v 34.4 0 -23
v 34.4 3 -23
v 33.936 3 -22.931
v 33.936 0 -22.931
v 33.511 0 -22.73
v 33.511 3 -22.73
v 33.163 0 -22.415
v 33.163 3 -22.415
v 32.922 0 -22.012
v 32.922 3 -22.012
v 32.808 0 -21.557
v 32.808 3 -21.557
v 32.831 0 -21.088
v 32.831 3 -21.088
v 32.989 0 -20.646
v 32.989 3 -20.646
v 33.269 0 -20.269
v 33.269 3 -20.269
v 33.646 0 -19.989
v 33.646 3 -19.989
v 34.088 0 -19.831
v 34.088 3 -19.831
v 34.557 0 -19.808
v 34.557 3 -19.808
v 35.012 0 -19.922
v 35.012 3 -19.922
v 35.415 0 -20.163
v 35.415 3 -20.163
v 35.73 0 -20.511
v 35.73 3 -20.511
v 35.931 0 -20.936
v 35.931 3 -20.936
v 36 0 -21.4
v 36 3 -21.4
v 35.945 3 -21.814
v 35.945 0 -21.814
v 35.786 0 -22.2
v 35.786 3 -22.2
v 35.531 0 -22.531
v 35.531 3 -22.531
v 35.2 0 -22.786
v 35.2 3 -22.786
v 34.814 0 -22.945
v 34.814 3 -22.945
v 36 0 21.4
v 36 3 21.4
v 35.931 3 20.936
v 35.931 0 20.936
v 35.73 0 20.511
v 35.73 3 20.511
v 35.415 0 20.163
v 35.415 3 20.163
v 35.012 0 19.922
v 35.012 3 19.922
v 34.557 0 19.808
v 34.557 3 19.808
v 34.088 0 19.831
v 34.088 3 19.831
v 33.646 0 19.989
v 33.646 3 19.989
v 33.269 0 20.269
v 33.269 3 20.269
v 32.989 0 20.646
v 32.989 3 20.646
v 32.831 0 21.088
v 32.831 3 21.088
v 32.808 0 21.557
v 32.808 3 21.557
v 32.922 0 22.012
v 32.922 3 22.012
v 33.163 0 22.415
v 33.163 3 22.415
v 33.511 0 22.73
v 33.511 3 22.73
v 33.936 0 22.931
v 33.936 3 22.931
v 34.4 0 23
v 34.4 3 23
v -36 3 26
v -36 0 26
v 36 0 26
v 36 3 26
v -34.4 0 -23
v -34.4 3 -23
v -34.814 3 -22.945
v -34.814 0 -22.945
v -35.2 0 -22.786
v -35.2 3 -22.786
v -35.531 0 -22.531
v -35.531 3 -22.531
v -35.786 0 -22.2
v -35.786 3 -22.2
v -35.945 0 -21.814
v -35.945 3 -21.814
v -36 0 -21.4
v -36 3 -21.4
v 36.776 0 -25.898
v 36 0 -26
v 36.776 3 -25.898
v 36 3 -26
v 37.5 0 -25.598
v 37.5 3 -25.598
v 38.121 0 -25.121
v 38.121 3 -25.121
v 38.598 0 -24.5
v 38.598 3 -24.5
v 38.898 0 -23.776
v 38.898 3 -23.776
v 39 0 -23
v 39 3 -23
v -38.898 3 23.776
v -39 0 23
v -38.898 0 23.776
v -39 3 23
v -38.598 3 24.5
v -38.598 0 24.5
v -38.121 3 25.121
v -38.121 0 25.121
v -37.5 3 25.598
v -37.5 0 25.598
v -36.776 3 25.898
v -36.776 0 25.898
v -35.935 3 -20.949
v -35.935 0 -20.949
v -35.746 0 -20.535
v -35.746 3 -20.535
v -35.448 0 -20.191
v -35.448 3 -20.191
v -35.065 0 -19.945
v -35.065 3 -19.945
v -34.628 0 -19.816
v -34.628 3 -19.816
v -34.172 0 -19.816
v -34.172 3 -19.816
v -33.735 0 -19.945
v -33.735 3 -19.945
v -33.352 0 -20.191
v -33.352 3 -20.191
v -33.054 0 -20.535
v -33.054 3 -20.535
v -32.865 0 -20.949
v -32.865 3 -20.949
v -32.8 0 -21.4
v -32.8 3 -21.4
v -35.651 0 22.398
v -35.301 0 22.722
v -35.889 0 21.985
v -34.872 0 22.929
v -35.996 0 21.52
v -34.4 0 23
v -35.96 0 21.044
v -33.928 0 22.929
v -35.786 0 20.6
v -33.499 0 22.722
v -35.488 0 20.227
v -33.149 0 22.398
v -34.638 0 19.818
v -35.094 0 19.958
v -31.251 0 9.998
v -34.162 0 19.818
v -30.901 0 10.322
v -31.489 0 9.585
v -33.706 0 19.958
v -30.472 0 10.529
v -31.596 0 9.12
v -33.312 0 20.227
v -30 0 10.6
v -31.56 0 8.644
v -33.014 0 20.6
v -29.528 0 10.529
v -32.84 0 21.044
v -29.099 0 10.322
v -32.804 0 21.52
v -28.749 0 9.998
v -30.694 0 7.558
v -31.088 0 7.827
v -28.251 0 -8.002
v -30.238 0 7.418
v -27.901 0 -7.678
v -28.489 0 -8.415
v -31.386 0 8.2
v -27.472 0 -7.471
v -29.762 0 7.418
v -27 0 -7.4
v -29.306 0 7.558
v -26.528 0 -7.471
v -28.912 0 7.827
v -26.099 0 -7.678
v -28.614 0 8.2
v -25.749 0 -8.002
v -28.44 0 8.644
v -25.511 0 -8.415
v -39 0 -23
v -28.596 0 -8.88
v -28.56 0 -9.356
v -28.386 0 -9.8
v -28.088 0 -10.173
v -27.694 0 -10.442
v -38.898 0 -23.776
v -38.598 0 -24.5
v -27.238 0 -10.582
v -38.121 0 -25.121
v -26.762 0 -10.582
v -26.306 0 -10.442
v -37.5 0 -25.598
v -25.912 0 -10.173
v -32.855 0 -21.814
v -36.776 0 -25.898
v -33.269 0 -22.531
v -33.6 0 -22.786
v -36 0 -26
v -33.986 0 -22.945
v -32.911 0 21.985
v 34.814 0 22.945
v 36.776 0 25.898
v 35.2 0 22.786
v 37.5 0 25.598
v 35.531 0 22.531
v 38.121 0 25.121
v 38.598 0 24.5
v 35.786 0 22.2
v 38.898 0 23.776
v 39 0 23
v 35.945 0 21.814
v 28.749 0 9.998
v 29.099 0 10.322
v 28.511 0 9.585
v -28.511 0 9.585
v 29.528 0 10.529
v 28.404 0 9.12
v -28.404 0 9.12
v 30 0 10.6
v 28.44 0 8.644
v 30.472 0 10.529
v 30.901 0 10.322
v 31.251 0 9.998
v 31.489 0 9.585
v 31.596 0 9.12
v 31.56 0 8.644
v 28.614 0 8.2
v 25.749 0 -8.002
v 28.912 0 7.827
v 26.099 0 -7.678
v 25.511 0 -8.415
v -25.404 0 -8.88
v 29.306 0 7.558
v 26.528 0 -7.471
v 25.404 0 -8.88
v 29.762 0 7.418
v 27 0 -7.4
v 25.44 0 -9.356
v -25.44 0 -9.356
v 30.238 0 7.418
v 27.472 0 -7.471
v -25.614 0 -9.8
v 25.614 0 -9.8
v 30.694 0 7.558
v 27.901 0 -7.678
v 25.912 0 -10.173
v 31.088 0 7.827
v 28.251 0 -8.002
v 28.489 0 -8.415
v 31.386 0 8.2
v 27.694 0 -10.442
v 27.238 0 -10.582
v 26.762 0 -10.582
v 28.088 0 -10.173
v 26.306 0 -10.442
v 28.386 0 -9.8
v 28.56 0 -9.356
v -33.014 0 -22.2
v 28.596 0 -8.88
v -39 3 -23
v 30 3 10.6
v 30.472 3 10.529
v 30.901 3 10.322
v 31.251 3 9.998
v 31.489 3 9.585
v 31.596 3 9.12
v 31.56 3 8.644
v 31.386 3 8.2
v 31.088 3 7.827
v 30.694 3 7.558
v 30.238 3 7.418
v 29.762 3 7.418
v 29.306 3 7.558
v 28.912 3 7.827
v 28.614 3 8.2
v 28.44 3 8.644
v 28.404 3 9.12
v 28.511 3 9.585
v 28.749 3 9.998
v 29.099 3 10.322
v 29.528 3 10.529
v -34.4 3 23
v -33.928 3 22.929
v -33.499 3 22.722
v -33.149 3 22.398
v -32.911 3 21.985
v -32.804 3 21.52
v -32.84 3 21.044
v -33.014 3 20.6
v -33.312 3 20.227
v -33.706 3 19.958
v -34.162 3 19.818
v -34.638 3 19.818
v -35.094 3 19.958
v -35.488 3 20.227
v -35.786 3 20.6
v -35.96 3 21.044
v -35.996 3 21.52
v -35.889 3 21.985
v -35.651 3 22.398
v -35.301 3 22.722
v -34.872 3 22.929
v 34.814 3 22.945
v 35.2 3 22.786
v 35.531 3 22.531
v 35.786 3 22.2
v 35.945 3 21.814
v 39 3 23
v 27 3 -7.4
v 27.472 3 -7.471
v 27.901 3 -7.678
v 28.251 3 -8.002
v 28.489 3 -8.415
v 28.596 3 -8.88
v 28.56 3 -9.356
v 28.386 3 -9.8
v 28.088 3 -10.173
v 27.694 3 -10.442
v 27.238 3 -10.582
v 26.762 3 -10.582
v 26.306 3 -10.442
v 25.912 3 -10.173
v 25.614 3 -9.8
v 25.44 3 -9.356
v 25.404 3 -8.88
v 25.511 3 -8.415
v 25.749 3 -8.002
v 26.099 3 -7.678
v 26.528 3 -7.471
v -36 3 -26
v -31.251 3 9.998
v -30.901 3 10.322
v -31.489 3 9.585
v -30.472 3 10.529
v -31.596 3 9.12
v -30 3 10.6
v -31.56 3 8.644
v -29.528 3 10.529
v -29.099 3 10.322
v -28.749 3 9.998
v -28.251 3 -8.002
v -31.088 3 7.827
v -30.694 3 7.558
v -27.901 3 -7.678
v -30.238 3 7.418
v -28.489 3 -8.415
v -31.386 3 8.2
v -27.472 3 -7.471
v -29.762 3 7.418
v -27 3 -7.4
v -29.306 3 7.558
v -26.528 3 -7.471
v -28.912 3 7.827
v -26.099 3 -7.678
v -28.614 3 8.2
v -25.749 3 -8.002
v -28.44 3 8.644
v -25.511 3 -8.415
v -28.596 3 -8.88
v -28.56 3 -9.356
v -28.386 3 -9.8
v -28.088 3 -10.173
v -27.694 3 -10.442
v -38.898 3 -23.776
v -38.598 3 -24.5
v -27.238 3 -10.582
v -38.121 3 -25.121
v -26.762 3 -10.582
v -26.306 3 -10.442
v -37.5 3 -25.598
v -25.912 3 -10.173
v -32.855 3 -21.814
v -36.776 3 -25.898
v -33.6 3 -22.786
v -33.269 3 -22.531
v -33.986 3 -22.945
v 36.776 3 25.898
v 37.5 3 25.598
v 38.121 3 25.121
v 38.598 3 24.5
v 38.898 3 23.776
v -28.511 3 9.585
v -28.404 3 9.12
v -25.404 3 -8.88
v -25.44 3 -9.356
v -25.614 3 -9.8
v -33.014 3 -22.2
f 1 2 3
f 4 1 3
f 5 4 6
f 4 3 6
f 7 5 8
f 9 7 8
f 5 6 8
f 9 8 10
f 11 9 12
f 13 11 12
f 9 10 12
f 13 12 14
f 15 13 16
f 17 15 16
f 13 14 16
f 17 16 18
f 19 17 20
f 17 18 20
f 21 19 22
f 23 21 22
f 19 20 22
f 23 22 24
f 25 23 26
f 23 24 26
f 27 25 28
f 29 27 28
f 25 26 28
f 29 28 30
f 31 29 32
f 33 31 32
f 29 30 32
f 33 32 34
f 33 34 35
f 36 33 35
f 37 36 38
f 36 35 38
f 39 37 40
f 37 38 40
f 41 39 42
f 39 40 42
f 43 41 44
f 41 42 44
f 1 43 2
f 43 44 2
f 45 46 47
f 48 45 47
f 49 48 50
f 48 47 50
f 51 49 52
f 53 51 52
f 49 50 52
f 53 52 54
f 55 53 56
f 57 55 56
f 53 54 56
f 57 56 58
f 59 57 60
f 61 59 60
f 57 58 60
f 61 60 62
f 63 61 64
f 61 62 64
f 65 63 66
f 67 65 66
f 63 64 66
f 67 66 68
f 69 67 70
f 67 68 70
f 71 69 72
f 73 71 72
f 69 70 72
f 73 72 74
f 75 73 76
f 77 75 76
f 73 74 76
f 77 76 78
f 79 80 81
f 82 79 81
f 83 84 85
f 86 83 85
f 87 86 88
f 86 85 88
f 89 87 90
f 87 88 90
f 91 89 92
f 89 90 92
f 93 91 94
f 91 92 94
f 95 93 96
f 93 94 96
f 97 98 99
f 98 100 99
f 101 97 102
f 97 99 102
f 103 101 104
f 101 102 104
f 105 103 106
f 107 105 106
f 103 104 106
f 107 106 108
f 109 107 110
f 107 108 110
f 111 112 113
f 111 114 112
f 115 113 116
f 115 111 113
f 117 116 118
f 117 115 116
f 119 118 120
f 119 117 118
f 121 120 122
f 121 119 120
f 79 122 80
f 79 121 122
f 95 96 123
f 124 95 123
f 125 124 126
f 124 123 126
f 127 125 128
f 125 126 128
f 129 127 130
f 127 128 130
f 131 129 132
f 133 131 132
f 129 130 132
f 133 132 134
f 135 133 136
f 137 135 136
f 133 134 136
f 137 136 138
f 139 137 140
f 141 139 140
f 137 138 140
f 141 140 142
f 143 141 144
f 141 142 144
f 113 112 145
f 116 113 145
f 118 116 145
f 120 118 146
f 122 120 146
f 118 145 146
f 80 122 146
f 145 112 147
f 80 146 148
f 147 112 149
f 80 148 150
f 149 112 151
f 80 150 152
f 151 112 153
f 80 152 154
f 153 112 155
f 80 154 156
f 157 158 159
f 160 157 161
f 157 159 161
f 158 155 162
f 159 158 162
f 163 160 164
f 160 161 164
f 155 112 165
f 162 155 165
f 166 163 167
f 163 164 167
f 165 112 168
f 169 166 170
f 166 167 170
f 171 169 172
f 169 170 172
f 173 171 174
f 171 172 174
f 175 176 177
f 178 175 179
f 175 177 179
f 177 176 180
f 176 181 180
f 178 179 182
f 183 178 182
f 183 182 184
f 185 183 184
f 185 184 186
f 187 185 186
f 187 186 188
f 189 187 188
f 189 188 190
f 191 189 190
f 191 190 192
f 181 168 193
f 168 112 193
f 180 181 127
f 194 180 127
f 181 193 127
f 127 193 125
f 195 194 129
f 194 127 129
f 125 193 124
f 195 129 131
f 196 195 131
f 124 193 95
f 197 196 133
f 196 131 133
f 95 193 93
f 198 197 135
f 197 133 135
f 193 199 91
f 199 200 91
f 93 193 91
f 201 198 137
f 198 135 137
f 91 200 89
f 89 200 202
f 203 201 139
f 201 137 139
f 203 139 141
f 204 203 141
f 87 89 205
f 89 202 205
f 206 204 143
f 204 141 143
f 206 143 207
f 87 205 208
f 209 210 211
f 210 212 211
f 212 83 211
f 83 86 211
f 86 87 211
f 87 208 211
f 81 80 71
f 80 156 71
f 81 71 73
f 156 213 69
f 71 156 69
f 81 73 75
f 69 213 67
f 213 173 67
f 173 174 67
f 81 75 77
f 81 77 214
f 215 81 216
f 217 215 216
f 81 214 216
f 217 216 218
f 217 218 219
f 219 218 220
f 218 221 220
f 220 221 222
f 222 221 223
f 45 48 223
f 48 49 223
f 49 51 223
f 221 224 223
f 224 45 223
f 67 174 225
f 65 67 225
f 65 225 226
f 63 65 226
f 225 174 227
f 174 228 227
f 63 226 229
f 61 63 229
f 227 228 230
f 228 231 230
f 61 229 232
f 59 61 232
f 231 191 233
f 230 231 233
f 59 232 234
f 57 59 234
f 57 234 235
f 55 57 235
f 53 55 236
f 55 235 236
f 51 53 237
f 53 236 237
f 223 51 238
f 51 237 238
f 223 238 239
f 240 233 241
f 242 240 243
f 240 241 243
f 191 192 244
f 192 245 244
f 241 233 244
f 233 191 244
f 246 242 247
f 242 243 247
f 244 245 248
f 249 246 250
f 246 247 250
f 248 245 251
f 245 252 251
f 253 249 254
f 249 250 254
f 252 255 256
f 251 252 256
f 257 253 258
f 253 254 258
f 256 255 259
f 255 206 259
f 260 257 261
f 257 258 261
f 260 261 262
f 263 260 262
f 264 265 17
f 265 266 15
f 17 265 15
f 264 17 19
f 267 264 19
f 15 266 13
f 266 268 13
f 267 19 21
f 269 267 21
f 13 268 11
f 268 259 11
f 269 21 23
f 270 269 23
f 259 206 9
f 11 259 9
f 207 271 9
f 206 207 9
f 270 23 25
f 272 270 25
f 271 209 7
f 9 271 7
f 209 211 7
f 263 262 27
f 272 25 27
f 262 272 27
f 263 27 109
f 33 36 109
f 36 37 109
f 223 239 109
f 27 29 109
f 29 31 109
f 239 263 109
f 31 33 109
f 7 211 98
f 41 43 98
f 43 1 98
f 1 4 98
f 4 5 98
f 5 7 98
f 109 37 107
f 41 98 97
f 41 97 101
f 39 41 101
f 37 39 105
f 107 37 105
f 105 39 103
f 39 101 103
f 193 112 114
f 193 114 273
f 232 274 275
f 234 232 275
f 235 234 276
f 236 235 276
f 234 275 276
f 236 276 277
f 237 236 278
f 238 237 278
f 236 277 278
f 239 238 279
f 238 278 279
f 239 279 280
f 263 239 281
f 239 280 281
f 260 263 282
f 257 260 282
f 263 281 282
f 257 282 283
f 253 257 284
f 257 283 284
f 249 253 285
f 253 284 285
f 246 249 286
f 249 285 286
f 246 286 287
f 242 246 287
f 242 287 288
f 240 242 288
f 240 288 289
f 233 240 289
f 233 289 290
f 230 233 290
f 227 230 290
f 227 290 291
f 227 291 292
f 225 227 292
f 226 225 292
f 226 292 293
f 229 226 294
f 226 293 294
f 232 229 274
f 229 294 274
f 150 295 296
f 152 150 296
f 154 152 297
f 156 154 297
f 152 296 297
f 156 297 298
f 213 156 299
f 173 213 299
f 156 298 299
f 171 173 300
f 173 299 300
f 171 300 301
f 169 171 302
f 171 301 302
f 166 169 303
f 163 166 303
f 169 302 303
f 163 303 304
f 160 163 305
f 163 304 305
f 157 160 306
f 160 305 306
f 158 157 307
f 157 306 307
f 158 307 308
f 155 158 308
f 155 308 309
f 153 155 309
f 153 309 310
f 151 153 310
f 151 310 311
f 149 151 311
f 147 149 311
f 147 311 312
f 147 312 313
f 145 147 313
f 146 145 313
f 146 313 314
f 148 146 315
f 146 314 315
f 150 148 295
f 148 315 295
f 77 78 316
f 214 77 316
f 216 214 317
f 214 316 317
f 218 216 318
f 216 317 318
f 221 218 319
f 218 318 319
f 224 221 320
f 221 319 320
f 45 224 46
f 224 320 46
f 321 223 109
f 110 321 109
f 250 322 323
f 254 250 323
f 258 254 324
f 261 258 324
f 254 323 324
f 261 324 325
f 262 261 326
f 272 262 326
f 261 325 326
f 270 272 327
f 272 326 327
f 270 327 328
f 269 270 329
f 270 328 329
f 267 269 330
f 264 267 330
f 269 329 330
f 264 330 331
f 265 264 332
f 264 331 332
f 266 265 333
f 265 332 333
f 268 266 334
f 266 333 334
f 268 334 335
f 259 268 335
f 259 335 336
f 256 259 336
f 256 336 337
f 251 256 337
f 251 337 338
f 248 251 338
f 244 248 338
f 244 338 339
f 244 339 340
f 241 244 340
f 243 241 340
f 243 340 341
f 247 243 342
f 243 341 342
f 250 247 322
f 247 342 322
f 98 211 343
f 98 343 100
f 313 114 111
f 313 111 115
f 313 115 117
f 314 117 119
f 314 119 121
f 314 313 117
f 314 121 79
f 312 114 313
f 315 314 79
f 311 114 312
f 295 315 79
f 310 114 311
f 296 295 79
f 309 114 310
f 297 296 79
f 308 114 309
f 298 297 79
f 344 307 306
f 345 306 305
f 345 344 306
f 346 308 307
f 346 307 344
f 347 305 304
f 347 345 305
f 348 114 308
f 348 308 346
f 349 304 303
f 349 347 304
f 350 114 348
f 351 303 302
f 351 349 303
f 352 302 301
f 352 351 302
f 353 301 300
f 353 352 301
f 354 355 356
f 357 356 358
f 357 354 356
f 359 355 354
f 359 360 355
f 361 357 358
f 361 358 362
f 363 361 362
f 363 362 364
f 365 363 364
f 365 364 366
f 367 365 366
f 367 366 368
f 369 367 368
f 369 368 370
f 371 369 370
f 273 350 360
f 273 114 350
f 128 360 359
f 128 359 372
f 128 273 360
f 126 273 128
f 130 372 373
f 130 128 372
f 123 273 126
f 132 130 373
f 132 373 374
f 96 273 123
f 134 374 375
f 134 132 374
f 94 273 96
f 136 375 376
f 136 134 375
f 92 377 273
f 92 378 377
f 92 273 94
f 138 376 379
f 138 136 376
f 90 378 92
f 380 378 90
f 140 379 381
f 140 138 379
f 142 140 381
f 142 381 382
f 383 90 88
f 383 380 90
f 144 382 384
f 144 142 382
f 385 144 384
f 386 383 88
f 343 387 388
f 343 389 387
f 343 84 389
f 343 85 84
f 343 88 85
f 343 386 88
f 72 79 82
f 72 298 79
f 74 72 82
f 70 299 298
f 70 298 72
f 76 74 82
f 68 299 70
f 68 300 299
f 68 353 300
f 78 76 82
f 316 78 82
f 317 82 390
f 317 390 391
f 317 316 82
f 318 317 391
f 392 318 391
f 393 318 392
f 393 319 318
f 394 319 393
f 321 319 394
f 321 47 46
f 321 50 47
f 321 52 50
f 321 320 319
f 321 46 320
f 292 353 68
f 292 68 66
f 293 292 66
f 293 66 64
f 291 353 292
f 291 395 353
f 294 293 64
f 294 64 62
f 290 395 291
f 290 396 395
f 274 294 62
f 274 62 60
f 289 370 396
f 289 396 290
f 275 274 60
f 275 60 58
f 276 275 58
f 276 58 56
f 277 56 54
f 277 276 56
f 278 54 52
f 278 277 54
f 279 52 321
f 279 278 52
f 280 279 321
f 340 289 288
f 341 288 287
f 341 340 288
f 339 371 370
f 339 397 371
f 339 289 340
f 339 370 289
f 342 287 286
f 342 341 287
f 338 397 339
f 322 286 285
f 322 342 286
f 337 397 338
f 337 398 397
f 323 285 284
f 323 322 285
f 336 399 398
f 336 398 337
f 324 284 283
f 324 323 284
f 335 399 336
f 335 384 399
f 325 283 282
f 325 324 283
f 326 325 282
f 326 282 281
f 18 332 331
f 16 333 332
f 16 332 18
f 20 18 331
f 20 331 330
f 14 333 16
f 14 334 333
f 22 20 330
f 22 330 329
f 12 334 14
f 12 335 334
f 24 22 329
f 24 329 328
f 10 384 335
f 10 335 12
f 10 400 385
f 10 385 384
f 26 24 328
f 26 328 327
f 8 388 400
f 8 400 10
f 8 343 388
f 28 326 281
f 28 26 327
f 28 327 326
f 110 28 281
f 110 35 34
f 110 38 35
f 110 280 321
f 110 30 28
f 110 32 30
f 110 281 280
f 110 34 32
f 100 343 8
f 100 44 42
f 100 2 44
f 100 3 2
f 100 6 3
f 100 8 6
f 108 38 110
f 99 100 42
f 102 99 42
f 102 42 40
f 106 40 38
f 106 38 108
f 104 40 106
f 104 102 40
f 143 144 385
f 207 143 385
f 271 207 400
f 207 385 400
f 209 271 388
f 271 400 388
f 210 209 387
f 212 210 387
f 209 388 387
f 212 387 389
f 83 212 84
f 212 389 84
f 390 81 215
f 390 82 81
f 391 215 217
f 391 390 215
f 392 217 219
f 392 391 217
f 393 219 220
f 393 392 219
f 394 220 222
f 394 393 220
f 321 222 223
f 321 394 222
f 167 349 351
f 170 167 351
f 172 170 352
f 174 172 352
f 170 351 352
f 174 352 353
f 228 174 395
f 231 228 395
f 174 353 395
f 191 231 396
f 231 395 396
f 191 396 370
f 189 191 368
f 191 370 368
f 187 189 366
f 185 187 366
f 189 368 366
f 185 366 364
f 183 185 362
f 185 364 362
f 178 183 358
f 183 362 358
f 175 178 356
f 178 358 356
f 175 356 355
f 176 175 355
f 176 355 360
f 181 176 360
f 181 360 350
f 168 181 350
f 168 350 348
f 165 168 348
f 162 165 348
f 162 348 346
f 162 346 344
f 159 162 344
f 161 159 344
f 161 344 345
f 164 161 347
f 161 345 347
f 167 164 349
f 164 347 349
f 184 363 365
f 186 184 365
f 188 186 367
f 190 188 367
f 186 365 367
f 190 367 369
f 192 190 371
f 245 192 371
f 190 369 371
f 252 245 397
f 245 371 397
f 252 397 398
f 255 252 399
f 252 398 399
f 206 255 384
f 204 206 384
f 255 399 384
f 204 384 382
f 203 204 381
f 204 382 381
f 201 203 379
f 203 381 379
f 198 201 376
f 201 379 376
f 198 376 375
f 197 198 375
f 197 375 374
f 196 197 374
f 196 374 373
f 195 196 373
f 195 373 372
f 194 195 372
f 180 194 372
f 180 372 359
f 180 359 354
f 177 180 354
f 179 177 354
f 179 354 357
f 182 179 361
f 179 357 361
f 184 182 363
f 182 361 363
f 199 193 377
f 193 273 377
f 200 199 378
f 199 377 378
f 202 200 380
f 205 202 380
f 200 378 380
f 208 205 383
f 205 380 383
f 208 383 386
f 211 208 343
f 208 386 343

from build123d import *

# Parameters (mm, degrees)
SKETCH_1_W          = 78
SKETCH_1_H          = 52
EXTRUDE_1_DEPTH     = 3
SKETCH_2_R          = 1.6
CUT_EXTRUDE_1_DEPTH = 3
SKETCH_7_R          = 1.6
CUT_EXTRUDE_2_DEPTH = 3
FILLET_1_R          = 3


with BuildPart() as part:
    # 草图1 → 凸台-拉伸1 (new body)
    with BuildSketch(Plane(origin=(0, 0, 0), x_dir=(1, 0, 0), z_dir=(0, 1, 0))):
        Rectangle(SKETCH_1_W, SKETCH_1_H)
    extrude(amount=EXTRUDE_1_DEPTH)

    # 草图2 → 切除-拉伸1 (cut)
    with BuildSketch(Plane(origin=(0, 3, 0), x_dir=(1, 0, 0), z_dir=(0, 1, 0))):
        with BuildLine():
            ThreePointArc((-32.8, 21.4), (-33.26862915, 22.53137085), (-34.4, 23))
            Line((-34.4, 23), (-34.4, 21.4))
            Line((-34.4, 21.4), (-36, 21.4))
            ThreePointArc((-36, 21.4), (-34.4, 19.8), (-32.8, 21.4))
        make_face()
        with BuildLine():
            Line((-34.4, 21.4), (-34.4, 23))
            ThreePointArc((-34.4, 23), (-35.53137085, 22.53137085), (-36, 21.4))
            Line((-36, 21.4), (-34.4, 21.4))
        make_face()
        with BuildLine():
            ThreePointArc((36, 21.4), (35.53137085, 22.53137085), (34.4, 23))
            Line((34.4, 23), (34.4, 21.4))
            Line((34.4, 21.4), (36, 21.4))
        make_face()
        with BuildLine():
            Line((34.4, 21.4), (34.4, 23))
            ThreePointArc((34.4, 23), (33.26862915, 20.26862915), (36, 21.4))
            Line((36, 21.4), (34.4, 21.4))
        make_face()
        with BuildLine():
            ThreePointArc((36, -21.4), (33.26862915, -20.26862915), (34.4, -23))
            Line((34.4, -23), (34.4, -21.4))
            Line((34.4, -21.4), (36, -21.4))
        make_face()
        with BuildLine():
            Line((34.4, -21.4), (34.4, -23))
            ThreePointArc((34.4, -23), (35.53137085, -22.53137085), (36, -21.4))
            Line((36, -21.4), (34.4, -21.4))
        make_face()
        with Locations(Location((-34.4, -21.4, 0), (0, 0, 270))):
            Circle(SKETCH_2_R)
    extrude(amount=-CUT_EXTRUDE_1_DEPTH, mode=Mode.SUBTRACT)

    # 草图7 → 切除-拉伸2 (cut)
    with BuildSketch(Plane(origin=(0, 3, 0), x_dir=(1, 0, 0), z_dir=(0, 1, 0))):
        with Locations(Location((-30, -9, 0), (0, 0, 270))):
            Circle(SKETCH_7_R)
        with Locations(Location((-27, 9, 0), (0, 0, 270))):
            Circle(SKETCH_7_R)
        with Locations(Location((27, 9, 0), (0, 0, 270))):
            Circle(SKETCH_7_R)
        with Locations(Location((30, -9, 0), (0, 0, 270))):
            Circle(SKETCH_7_R)
    extrude(amount=-CUT_EXTRUDE_2_DEPTH, mode=Mode.SUBTRACT)

    # 圆角1
    fillet_1_edges = [part.edges().sort_by_distance(p)[0] for p in [
        (39, 1.5, 26),
        (-39, 1.5, 26),
        (-39, 1.5, -26),
        (39, 1.5, -26),
    ]]
    fillet(fillet_1_edges, radius=FILLET_1_R)


solid = part.part
